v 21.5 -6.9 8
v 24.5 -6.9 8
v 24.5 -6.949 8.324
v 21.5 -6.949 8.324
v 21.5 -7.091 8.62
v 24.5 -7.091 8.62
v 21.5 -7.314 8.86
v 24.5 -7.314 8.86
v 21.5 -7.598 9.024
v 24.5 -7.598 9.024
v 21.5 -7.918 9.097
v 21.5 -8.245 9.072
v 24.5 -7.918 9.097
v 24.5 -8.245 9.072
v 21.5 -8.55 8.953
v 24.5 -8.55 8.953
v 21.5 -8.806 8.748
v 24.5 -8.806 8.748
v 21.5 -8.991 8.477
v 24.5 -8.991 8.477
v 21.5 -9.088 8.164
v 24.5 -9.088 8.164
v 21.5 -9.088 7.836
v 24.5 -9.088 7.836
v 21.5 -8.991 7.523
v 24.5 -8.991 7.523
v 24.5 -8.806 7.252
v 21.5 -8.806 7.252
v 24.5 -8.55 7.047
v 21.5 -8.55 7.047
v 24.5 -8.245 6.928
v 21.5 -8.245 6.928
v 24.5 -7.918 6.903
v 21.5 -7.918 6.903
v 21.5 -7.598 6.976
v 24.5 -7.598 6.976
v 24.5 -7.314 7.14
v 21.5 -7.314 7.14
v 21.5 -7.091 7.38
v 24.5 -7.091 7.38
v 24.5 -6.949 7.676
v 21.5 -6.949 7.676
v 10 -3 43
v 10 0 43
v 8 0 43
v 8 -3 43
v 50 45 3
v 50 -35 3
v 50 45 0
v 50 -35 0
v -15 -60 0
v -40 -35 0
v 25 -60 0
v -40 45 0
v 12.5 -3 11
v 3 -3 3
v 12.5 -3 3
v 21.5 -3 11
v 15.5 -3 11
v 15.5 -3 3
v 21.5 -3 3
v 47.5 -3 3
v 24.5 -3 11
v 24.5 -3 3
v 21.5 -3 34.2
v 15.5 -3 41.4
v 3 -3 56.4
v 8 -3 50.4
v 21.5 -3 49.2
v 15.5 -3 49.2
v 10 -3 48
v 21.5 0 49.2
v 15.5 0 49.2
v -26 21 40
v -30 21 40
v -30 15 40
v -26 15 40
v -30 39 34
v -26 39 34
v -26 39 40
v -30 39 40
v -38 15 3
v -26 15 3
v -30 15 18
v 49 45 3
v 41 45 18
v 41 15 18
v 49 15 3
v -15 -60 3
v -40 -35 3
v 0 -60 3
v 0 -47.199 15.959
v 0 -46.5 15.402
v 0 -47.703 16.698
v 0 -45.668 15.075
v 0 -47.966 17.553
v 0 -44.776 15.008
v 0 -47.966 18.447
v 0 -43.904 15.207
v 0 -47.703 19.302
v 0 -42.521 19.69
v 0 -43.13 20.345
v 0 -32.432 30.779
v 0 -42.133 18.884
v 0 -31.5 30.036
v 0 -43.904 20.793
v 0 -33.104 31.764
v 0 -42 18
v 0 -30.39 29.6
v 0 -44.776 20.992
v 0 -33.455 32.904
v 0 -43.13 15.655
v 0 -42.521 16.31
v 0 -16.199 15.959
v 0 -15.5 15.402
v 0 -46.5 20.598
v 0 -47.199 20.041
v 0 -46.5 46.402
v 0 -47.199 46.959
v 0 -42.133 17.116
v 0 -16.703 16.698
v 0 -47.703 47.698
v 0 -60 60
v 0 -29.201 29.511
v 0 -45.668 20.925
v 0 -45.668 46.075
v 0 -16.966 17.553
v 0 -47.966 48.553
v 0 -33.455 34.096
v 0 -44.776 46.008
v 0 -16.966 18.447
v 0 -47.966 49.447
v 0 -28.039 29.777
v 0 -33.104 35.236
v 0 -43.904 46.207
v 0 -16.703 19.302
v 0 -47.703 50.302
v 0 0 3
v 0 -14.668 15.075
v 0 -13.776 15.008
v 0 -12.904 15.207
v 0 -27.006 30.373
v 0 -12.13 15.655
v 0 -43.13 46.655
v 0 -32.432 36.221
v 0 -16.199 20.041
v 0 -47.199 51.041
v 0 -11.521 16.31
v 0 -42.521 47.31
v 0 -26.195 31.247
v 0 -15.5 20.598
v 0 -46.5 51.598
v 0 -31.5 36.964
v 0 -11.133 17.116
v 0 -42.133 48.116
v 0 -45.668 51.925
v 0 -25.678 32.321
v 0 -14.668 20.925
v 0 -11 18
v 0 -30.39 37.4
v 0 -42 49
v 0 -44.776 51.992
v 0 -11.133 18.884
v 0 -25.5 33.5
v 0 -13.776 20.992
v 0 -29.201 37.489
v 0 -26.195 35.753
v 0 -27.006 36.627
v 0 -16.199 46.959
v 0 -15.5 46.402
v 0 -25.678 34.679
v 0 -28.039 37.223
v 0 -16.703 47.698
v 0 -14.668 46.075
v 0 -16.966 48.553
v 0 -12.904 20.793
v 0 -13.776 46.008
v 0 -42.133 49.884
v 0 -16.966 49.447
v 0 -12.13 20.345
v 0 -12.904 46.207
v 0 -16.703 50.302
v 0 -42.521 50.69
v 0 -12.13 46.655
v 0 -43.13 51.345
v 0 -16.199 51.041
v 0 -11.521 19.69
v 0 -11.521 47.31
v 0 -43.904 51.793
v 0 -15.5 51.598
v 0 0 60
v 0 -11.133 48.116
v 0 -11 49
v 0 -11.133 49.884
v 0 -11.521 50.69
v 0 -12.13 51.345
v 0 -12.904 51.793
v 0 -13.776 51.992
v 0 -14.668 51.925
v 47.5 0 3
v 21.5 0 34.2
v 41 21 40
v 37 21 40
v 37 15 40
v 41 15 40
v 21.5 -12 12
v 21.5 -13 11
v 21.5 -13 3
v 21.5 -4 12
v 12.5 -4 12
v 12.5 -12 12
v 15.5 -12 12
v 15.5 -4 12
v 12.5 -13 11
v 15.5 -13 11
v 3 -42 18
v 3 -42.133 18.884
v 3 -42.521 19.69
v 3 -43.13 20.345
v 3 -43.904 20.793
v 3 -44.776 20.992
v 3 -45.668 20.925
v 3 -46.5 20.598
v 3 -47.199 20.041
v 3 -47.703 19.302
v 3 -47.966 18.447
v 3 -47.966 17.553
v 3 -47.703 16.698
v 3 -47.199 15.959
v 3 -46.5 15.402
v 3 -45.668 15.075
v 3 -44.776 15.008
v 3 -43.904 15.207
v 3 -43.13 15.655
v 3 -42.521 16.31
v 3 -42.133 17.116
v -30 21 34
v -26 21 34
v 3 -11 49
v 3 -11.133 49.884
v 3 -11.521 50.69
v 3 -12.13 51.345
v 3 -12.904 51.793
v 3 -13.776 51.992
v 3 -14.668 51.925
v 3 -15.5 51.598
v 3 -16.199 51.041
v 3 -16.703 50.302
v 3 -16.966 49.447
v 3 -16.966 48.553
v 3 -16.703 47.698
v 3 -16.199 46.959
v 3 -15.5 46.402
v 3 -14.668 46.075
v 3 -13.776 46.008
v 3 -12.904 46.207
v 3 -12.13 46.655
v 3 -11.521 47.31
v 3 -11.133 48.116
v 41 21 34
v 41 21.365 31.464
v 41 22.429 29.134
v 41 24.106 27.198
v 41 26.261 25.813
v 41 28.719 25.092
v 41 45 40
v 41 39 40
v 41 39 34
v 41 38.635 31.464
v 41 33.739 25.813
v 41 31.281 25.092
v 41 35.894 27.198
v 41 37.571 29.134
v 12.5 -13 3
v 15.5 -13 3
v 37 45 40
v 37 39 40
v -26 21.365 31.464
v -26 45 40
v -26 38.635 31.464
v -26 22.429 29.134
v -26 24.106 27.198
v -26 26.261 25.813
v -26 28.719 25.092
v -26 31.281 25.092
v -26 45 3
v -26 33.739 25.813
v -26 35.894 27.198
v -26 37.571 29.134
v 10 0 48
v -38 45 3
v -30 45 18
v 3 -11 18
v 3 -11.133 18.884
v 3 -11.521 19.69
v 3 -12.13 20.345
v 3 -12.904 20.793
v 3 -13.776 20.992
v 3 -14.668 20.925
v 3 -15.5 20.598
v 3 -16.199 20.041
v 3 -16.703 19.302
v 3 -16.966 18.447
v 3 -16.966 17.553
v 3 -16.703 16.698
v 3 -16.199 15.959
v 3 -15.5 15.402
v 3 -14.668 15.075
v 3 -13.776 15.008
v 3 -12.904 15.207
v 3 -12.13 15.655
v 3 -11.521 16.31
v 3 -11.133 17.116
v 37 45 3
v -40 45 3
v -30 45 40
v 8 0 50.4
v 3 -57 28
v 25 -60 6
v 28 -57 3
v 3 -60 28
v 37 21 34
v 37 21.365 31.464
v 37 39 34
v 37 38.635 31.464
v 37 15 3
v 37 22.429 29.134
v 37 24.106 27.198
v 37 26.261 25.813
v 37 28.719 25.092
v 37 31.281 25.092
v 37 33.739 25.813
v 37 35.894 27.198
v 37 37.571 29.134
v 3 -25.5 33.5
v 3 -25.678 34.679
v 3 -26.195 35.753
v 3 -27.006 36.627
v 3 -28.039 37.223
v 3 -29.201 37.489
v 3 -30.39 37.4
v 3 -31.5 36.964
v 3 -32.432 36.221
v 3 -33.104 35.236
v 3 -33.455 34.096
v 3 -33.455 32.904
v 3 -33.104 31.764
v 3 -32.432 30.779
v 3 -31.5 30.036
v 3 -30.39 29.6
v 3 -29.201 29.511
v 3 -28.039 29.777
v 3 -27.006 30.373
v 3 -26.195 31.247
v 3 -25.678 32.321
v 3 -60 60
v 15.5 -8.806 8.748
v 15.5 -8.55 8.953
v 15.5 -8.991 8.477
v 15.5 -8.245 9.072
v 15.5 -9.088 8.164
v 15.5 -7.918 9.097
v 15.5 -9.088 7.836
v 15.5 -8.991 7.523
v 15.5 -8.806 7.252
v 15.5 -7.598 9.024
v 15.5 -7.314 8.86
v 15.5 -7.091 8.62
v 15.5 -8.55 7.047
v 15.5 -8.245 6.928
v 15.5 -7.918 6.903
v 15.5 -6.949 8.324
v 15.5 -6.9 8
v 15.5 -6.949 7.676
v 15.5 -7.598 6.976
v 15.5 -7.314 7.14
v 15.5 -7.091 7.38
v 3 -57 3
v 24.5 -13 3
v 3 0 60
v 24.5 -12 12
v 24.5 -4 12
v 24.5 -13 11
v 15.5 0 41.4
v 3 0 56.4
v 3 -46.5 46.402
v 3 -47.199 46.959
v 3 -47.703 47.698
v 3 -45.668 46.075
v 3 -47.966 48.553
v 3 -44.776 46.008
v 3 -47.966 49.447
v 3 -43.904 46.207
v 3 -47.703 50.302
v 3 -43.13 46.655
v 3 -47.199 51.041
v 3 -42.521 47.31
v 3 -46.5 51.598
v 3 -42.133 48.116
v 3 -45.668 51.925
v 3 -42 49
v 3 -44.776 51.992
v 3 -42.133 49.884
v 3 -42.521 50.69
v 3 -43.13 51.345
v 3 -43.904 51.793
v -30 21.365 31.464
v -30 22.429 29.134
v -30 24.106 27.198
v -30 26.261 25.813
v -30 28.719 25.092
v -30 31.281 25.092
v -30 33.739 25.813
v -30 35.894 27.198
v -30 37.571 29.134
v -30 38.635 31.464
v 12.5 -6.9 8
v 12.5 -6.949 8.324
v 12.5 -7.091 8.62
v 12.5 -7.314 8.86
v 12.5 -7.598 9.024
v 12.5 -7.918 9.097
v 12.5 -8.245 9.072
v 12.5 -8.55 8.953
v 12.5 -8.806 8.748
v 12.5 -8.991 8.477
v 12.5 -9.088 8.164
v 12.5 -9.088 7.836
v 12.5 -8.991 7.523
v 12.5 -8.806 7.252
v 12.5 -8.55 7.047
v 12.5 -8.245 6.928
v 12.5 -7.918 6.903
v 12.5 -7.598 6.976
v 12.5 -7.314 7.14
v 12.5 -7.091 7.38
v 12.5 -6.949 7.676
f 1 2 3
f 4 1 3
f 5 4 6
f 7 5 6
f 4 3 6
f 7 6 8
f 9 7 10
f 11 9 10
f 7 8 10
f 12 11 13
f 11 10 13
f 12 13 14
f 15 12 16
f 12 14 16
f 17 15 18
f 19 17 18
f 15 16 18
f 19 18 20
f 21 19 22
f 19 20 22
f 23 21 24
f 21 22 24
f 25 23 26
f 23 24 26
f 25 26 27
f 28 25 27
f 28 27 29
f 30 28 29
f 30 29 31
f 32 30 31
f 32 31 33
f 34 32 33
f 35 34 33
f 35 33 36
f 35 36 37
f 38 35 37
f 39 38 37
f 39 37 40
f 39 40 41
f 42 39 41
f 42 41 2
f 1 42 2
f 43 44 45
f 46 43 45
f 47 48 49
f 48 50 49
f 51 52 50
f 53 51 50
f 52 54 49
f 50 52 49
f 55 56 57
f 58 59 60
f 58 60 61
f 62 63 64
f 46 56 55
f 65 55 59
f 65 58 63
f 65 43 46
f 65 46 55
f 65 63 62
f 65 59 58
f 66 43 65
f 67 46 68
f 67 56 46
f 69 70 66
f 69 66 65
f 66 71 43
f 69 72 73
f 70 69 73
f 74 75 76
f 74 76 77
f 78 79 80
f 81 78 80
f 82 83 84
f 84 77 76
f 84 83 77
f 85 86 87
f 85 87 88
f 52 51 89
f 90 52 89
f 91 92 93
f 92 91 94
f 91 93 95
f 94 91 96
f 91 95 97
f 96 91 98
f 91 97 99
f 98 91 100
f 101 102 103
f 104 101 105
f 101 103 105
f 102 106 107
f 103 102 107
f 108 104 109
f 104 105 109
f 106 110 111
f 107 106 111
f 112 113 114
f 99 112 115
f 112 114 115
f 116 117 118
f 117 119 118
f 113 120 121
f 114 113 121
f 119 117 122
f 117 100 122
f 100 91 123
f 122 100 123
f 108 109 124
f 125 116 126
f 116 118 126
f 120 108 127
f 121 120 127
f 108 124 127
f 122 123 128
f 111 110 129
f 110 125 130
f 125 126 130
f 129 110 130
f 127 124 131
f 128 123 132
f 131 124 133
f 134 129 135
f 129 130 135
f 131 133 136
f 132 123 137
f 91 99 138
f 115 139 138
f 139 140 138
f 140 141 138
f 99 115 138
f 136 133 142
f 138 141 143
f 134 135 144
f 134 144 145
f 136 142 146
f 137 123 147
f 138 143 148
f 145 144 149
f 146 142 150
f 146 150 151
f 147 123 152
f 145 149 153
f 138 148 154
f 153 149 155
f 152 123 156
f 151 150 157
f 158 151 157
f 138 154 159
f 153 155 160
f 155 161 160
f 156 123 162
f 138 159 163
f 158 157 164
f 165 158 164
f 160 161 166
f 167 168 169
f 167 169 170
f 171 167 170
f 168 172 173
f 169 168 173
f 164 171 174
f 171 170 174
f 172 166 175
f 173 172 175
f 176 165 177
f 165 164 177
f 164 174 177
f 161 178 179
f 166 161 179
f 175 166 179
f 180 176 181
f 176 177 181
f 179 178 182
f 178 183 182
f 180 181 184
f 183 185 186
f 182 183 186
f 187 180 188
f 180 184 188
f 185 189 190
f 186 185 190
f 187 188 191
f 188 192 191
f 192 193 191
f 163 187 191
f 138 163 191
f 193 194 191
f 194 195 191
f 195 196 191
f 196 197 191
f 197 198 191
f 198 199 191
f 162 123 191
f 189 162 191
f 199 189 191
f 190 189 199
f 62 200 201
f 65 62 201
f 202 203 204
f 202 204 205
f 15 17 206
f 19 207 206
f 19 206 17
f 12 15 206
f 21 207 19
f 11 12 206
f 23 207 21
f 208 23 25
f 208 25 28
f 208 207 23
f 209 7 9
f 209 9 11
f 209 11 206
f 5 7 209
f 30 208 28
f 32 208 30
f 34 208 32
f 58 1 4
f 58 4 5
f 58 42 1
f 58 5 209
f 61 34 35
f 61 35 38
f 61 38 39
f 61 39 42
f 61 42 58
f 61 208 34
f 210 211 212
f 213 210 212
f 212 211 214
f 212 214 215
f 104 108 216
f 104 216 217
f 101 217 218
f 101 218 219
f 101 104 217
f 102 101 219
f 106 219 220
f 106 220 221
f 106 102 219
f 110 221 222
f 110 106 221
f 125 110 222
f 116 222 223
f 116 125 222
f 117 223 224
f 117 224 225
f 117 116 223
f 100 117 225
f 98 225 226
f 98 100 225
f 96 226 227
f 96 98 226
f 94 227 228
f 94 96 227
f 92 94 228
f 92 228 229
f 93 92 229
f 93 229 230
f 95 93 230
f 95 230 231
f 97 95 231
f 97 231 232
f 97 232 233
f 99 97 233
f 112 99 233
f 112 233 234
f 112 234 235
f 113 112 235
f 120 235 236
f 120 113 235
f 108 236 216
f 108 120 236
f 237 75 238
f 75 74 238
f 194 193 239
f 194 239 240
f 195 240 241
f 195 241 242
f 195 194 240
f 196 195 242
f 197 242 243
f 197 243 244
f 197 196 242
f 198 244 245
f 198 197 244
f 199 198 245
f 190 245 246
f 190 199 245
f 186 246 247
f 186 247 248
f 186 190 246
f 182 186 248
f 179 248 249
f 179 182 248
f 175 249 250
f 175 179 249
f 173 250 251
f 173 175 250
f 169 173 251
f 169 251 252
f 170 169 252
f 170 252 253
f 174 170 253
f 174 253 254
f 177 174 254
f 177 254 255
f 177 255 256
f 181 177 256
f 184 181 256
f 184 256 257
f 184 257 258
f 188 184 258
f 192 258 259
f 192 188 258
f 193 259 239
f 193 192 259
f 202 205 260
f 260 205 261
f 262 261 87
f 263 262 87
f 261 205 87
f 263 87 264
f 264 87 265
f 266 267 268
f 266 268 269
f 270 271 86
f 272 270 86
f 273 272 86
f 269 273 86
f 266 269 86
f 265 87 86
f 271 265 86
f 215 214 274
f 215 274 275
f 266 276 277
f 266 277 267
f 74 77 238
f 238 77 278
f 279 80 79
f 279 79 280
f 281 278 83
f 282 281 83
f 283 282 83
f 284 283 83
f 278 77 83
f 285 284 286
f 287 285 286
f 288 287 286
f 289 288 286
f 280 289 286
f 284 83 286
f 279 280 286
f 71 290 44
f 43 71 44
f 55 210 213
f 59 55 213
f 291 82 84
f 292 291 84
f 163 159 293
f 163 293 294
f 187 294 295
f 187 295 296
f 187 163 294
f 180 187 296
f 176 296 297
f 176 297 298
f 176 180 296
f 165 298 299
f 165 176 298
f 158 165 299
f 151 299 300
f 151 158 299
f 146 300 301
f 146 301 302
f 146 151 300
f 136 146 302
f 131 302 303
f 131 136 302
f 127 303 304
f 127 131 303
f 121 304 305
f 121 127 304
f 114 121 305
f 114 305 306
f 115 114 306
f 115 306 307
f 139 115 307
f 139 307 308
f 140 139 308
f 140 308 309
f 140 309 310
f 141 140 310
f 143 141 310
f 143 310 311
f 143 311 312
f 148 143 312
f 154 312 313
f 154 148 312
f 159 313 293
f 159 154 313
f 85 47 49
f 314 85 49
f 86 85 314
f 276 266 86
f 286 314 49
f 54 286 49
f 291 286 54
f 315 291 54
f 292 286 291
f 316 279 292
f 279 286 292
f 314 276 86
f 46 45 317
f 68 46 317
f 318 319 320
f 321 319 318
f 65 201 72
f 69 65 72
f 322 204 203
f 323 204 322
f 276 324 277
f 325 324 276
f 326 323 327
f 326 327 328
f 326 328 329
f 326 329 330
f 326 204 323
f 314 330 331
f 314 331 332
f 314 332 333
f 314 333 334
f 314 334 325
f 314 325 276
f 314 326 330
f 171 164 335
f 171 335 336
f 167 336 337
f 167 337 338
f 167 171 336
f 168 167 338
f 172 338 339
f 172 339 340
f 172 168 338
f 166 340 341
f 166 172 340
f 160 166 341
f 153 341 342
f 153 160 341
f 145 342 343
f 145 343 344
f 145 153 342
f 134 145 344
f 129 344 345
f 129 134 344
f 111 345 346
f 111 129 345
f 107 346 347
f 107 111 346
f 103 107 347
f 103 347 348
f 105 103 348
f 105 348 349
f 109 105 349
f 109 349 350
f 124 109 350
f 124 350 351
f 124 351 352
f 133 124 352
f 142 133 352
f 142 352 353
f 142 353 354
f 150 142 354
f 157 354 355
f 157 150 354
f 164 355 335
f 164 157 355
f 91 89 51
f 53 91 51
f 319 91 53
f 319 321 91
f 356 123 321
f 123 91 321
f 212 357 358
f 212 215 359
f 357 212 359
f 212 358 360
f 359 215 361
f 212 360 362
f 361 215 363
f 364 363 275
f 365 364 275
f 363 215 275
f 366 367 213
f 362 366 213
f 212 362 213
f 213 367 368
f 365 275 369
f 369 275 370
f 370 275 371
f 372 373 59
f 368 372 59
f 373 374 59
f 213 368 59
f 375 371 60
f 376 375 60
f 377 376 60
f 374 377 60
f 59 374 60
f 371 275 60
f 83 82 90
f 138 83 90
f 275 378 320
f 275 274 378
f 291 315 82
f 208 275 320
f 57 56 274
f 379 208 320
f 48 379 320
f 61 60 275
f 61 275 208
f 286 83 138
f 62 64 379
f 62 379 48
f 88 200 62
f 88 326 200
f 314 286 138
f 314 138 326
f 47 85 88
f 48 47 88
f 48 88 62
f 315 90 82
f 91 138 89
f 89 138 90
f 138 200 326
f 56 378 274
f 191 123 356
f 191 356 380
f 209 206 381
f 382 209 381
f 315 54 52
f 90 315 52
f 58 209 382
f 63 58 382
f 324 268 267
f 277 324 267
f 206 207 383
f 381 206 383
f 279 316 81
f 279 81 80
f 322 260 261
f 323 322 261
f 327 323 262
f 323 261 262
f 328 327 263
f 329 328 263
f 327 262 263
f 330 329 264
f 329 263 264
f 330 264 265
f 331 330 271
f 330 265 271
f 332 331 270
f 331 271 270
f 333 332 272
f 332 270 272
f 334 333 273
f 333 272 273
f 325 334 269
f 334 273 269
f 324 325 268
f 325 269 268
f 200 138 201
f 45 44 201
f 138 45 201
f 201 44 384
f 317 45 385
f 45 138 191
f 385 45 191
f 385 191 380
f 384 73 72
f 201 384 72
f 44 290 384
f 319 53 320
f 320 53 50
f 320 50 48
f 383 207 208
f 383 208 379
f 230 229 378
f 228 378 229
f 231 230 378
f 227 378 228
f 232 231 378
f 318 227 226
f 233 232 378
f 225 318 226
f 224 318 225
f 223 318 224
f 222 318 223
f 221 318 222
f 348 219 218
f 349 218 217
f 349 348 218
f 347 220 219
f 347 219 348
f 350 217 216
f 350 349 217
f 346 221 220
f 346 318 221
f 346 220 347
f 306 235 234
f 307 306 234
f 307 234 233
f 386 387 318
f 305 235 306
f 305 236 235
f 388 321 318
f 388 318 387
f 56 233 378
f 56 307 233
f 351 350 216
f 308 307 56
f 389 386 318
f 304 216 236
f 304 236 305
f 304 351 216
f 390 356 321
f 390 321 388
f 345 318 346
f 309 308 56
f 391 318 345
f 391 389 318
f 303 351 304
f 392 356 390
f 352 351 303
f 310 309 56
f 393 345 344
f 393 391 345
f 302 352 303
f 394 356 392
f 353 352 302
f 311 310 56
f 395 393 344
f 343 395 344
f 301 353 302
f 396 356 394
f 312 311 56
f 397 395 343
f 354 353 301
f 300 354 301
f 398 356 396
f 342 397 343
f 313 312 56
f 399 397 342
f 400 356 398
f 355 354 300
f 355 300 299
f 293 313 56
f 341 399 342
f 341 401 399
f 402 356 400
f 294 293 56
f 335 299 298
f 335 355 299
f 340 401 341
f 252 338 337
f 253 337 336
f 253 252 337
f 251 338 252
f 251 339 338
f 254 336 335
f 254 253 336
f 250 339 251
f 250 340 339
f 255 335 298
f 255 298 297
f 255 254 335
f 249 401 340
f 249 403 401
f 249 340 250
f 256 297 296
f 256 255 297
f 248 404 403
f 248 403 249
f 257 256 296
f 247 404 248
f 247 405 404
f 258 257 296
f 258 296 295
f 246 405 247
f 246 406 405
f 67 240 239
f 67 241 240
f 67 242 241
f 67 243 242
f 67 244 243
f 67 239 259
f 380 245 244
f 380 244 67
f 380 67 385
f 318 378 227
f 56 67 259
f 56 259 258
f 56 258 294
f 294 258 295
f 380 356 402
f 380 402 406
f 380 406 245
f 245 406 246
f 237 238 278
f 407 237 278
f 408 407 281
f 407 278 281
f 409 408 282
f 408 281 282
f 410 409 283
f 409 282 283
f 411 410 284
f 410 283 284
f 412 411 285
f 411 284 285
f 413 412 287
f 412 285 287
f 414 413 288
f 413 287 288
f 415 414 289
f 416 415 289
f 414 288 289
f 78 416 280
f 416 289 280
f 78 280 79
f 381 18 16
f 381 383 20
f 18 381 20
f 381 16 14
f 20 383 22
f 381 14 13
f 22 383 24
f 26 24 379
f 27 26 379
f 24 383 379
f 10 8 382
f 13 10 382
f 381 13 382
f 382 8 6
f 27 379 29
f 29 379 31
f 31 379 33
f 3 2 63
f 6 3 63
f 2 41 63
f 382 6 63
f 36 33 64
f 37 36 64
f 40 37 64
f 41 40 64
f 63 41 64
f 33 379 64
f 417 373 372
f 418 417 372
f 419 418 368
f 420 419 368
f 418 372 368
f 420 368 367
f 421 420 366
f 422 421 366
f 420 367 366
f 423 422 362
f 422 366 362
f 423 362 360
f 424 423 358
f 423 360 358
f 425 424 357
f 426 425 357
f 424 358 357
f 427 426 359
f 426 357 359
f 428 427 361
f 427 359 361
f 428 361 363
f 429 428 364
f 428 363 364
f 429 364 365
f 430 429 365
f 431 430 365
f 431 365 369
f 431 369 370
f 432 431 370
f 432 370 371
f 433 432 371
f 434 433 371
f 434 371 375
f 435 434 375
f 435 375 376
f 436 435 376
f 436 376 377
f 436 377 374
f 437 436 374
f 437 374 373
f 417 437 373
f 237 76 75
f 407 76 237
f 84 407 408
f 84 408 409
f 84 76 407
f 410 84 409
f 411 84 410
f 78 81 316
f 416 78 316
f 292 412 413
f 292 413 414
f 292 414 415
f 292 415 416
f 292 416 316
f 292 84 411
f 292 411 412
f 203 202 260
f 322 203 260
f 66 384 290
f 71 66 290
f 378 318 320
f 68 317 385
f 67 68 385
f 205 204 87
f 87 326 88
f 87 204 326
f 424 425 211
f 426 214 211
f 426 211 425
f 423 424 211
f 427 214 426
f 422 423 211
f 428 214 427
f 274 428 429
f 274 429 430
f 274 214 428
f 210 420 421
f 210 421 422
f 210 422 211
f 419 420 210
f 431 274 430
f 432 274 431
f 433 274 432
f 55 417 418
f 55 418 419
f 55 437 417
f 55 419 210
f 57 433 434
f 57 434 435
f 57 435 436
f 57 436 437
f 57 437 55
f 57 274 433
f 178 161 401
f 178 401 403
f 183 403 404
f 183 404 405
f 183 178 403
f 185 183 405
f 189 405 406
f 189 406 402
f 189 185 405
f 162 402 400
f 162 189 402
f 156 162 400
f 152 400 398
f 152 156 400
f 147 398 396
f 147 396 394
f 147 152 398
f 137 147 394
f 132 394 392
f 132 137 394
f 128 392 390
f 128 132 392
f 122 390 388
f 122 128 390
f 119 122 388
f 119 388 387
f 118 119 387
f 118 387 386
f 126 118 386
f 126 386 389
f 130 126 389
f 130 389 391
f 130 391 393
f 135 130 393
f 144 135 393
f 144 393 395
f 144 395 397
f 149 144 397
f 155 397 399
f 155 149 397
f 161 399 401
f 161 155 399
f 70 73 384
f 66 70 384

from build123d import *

# Parameters (mm, degrees)
F0_W      = 40
F0_H      = 60
F0_W_2    = 50
F0_W_3    = 3
F0_H_2    = 10
F1_DEPTH  = 3
F0_W_4    = 4
F0_H_3    = 30
F2_DEPTH  = 40
F3_DEPTH  = 12
F4_SIZE   = 1
F5_R      = 1.1
F6_DEPTH  = 13
F7_W      = 60
F7_H      = 60
F7_R      = 3
F7_R_2    = 4
F8_DEPTH  = 3
F10_DEPTH = 3
F12_DEPTH = 100
F14_DEPTH = 3
F15_SIZE  = 24.99999
F17_DEPTH = 30


# Not quite as in the source:
# - a fillet or chamfer is up to 0.001 mm smaller than in the source, because OpenCascade refuses the exact size
# - a feature names something its author has since deleted; it is built from what else it names


with BuildPart() as f1:
    # F0 (on Top) → F1 (new body)
    with BuildSketch(Plane.XY):
        with Locations((-20, -30)):
            Rectangle(F0_W, F0_H)
        with Locations((25, -30)):
            Rectangle(F0_W_2, F0_H)
        with Locations((14, -8)):
            Rectangle(F0_W_3, F0_H_2, mode=Mode.SUBTRACT)
        with Locations((23, -8)):
            Rectangle(F0_W_3, F0_H_2, mode=Mode.SUBTRACT)
        Polygon((0, 45), (0, 0), (50, 0), (50, 45), (41, 45), (41, 15), (37, 15), (37, 45), align=None)
        Polygon((-40, 0), (0, 0), (0, 45), (-26, 45), (-26, 15), (-30, 15), (-30, 45), (-40, 45), align=None)
    extrude(amount=F1_DEPTH)

    # F0 (on Top) → F2 (join)
    with BuildSketch(Plane.XY):
        with Locations((-28, 30)):
            Rectangle(F0_W_4, F0_H_3)
        with Locations((39, 30)):
            Rectangle(F0_W_4, F0_H_3)
    extrude(amount=F2_DEPTH)

    # F0 (on Top) → F3 (join)
    with BuildSketch(Plane.XY):
        with Locations((23, -8)):
            Rectangle(F0_W_3, F0_H_2)
        with Locations((14, -8)):
            Rectangle(F0_W_3, F0_H_2)
    extrude(amount=F3_DEPTH)

    # F4
    f4_edges = [f1.edges().sort_by_distance(p)[0] for p in [
        (14, -3, 12),
        (23, -3, 12),
        (23, -13, 12),
        (14, -13, 12),
    ]]
    chamfer(f4_edges, length=F4_SIZE)

    # F5 (on face) → F6 (cut)
    with BuildSketch(Plane.YZ.offset(24.5)):
        with Locations((-8, 8)):
            Circle(F5_R)
    extrude(amount=-F6_DEPTH, mode=Mode.SUBTRACT)

    # F7 (on Right) → F8 (join)
    with BuildSketch(Plane.YZ):
        with Locations((-30, 30)):
            Rectangle(F7_W, F7_H)
        with Locations((-45, 18)):
            Circle(F7_R, mode=Mode.SUBTRACT)
        with Locations((-14, 18)):
            Circle(F7_R, mode=Mode.SUBTRACT)
        with Locations((-45, 49)):
            Circle(F7_R, mode=Mode.SUBTRACT)
        with Locations((-29.5, 33.5)):
            Circle(F7_R_2, mode=Mode.SUBTRACT)
        with Locations((-14, 49)):
            Circle(F7_R, mode=Mode.SUBTRACT)
    extrude(amount=F8_DEPTH)

    # F9 (on Front) → F10 (join)
    with BuildSketch(Plane.XZ):
        Polygon((0, 60), (0, 0), (50, 0), (21.5, 34.2), (15.5, 41.4), (10, 48), (10, 43), (8, 43), (8, 50.4), align=None)
        Polygon((15.5, 41.4), (21.5, 34.2), (21.5, 49.2), (15.5, 49.2), align=None)
    extrude(amount=F10_DEPTH)

    # F11 (on face) → F12 (cut)
    with BuildSketch(Plane.YZ.offset(41)):
        with BuildLine():
            Line((21, 40), (23.2917960675, 40))
            ThreePointArc((23.2917960675, 40), (30, 43), (36.7082039325, 40))
            Line((36.7082039325, 40), (39, 40))
            Line((39, 40), (39, 47))
            Line((39, 47), (21, 47))
            Line((21, 47), (21, 40))
        make_face()
        with BuildLine():
            ThreePointArc((23.2917960675, 40), (21.5924487693, 37.211398808), (21, 34))
            ThreePointArc((21, 34), (30, 25), (39, 34))
            ThreePointArc((39, 34), (38.4075512307, 37.211398808), (36.7082039325, 40))
            Line((36.7082039325, 40), (23.2917960675, 40))
        make_face()
        with BuildLine():
            Line((21, 40), (21, 34))
            ThreePointArc((21, 34), (21.5924487693, 37.211398808), (23.2917960675, 40))
            Line((23.2917960675, 40), (21, 40))
        make_face()
        with BuildLine():
            ThreePointArc((36.7082039325, 40), (38.4075512307, 37.211398808), (39, 34))
            Line((39, 34), (39, 40))
            Line((39, 40), (36.7082039325, 40))
        make_face()
    extrude(amount=-F12_DEPTH, mode=Mode.SUBTRACT)

    # F13 (on face) → F14 (join)
    with BuildSketch(Plane.XZ.offset(60)):
        Polygon((3, 28), (3, 3), (28, 3), align=None)
    extrude(amount=-F14_DEPTH)

    # F15 (size 25 in the source; OpenCascade refuses exactly that, so slightly less here)
    f15_edges = [f1.edges().sort_by_distance(p)[0] for p in [
        (50, -60, 1.5),
        (-40, -60, 1.5),
    ]]
    chamfer(f15_edges, length=F15_SIZE)

    # F16 (on face) → F17 (join)
    with BuildSketch(Plane(origin=(0, 45, 0), x_dir=(-1, 0, 0), z_dir=(0, 1, 0))):
        Polygon((30, 3), (38, 3), (30, 18), align=None)
        Polygon((-49, 3), (-41, 3), (-41, 18), align=None)
    extrude(amount=-F17_DEPTH)


solid = f1.part
